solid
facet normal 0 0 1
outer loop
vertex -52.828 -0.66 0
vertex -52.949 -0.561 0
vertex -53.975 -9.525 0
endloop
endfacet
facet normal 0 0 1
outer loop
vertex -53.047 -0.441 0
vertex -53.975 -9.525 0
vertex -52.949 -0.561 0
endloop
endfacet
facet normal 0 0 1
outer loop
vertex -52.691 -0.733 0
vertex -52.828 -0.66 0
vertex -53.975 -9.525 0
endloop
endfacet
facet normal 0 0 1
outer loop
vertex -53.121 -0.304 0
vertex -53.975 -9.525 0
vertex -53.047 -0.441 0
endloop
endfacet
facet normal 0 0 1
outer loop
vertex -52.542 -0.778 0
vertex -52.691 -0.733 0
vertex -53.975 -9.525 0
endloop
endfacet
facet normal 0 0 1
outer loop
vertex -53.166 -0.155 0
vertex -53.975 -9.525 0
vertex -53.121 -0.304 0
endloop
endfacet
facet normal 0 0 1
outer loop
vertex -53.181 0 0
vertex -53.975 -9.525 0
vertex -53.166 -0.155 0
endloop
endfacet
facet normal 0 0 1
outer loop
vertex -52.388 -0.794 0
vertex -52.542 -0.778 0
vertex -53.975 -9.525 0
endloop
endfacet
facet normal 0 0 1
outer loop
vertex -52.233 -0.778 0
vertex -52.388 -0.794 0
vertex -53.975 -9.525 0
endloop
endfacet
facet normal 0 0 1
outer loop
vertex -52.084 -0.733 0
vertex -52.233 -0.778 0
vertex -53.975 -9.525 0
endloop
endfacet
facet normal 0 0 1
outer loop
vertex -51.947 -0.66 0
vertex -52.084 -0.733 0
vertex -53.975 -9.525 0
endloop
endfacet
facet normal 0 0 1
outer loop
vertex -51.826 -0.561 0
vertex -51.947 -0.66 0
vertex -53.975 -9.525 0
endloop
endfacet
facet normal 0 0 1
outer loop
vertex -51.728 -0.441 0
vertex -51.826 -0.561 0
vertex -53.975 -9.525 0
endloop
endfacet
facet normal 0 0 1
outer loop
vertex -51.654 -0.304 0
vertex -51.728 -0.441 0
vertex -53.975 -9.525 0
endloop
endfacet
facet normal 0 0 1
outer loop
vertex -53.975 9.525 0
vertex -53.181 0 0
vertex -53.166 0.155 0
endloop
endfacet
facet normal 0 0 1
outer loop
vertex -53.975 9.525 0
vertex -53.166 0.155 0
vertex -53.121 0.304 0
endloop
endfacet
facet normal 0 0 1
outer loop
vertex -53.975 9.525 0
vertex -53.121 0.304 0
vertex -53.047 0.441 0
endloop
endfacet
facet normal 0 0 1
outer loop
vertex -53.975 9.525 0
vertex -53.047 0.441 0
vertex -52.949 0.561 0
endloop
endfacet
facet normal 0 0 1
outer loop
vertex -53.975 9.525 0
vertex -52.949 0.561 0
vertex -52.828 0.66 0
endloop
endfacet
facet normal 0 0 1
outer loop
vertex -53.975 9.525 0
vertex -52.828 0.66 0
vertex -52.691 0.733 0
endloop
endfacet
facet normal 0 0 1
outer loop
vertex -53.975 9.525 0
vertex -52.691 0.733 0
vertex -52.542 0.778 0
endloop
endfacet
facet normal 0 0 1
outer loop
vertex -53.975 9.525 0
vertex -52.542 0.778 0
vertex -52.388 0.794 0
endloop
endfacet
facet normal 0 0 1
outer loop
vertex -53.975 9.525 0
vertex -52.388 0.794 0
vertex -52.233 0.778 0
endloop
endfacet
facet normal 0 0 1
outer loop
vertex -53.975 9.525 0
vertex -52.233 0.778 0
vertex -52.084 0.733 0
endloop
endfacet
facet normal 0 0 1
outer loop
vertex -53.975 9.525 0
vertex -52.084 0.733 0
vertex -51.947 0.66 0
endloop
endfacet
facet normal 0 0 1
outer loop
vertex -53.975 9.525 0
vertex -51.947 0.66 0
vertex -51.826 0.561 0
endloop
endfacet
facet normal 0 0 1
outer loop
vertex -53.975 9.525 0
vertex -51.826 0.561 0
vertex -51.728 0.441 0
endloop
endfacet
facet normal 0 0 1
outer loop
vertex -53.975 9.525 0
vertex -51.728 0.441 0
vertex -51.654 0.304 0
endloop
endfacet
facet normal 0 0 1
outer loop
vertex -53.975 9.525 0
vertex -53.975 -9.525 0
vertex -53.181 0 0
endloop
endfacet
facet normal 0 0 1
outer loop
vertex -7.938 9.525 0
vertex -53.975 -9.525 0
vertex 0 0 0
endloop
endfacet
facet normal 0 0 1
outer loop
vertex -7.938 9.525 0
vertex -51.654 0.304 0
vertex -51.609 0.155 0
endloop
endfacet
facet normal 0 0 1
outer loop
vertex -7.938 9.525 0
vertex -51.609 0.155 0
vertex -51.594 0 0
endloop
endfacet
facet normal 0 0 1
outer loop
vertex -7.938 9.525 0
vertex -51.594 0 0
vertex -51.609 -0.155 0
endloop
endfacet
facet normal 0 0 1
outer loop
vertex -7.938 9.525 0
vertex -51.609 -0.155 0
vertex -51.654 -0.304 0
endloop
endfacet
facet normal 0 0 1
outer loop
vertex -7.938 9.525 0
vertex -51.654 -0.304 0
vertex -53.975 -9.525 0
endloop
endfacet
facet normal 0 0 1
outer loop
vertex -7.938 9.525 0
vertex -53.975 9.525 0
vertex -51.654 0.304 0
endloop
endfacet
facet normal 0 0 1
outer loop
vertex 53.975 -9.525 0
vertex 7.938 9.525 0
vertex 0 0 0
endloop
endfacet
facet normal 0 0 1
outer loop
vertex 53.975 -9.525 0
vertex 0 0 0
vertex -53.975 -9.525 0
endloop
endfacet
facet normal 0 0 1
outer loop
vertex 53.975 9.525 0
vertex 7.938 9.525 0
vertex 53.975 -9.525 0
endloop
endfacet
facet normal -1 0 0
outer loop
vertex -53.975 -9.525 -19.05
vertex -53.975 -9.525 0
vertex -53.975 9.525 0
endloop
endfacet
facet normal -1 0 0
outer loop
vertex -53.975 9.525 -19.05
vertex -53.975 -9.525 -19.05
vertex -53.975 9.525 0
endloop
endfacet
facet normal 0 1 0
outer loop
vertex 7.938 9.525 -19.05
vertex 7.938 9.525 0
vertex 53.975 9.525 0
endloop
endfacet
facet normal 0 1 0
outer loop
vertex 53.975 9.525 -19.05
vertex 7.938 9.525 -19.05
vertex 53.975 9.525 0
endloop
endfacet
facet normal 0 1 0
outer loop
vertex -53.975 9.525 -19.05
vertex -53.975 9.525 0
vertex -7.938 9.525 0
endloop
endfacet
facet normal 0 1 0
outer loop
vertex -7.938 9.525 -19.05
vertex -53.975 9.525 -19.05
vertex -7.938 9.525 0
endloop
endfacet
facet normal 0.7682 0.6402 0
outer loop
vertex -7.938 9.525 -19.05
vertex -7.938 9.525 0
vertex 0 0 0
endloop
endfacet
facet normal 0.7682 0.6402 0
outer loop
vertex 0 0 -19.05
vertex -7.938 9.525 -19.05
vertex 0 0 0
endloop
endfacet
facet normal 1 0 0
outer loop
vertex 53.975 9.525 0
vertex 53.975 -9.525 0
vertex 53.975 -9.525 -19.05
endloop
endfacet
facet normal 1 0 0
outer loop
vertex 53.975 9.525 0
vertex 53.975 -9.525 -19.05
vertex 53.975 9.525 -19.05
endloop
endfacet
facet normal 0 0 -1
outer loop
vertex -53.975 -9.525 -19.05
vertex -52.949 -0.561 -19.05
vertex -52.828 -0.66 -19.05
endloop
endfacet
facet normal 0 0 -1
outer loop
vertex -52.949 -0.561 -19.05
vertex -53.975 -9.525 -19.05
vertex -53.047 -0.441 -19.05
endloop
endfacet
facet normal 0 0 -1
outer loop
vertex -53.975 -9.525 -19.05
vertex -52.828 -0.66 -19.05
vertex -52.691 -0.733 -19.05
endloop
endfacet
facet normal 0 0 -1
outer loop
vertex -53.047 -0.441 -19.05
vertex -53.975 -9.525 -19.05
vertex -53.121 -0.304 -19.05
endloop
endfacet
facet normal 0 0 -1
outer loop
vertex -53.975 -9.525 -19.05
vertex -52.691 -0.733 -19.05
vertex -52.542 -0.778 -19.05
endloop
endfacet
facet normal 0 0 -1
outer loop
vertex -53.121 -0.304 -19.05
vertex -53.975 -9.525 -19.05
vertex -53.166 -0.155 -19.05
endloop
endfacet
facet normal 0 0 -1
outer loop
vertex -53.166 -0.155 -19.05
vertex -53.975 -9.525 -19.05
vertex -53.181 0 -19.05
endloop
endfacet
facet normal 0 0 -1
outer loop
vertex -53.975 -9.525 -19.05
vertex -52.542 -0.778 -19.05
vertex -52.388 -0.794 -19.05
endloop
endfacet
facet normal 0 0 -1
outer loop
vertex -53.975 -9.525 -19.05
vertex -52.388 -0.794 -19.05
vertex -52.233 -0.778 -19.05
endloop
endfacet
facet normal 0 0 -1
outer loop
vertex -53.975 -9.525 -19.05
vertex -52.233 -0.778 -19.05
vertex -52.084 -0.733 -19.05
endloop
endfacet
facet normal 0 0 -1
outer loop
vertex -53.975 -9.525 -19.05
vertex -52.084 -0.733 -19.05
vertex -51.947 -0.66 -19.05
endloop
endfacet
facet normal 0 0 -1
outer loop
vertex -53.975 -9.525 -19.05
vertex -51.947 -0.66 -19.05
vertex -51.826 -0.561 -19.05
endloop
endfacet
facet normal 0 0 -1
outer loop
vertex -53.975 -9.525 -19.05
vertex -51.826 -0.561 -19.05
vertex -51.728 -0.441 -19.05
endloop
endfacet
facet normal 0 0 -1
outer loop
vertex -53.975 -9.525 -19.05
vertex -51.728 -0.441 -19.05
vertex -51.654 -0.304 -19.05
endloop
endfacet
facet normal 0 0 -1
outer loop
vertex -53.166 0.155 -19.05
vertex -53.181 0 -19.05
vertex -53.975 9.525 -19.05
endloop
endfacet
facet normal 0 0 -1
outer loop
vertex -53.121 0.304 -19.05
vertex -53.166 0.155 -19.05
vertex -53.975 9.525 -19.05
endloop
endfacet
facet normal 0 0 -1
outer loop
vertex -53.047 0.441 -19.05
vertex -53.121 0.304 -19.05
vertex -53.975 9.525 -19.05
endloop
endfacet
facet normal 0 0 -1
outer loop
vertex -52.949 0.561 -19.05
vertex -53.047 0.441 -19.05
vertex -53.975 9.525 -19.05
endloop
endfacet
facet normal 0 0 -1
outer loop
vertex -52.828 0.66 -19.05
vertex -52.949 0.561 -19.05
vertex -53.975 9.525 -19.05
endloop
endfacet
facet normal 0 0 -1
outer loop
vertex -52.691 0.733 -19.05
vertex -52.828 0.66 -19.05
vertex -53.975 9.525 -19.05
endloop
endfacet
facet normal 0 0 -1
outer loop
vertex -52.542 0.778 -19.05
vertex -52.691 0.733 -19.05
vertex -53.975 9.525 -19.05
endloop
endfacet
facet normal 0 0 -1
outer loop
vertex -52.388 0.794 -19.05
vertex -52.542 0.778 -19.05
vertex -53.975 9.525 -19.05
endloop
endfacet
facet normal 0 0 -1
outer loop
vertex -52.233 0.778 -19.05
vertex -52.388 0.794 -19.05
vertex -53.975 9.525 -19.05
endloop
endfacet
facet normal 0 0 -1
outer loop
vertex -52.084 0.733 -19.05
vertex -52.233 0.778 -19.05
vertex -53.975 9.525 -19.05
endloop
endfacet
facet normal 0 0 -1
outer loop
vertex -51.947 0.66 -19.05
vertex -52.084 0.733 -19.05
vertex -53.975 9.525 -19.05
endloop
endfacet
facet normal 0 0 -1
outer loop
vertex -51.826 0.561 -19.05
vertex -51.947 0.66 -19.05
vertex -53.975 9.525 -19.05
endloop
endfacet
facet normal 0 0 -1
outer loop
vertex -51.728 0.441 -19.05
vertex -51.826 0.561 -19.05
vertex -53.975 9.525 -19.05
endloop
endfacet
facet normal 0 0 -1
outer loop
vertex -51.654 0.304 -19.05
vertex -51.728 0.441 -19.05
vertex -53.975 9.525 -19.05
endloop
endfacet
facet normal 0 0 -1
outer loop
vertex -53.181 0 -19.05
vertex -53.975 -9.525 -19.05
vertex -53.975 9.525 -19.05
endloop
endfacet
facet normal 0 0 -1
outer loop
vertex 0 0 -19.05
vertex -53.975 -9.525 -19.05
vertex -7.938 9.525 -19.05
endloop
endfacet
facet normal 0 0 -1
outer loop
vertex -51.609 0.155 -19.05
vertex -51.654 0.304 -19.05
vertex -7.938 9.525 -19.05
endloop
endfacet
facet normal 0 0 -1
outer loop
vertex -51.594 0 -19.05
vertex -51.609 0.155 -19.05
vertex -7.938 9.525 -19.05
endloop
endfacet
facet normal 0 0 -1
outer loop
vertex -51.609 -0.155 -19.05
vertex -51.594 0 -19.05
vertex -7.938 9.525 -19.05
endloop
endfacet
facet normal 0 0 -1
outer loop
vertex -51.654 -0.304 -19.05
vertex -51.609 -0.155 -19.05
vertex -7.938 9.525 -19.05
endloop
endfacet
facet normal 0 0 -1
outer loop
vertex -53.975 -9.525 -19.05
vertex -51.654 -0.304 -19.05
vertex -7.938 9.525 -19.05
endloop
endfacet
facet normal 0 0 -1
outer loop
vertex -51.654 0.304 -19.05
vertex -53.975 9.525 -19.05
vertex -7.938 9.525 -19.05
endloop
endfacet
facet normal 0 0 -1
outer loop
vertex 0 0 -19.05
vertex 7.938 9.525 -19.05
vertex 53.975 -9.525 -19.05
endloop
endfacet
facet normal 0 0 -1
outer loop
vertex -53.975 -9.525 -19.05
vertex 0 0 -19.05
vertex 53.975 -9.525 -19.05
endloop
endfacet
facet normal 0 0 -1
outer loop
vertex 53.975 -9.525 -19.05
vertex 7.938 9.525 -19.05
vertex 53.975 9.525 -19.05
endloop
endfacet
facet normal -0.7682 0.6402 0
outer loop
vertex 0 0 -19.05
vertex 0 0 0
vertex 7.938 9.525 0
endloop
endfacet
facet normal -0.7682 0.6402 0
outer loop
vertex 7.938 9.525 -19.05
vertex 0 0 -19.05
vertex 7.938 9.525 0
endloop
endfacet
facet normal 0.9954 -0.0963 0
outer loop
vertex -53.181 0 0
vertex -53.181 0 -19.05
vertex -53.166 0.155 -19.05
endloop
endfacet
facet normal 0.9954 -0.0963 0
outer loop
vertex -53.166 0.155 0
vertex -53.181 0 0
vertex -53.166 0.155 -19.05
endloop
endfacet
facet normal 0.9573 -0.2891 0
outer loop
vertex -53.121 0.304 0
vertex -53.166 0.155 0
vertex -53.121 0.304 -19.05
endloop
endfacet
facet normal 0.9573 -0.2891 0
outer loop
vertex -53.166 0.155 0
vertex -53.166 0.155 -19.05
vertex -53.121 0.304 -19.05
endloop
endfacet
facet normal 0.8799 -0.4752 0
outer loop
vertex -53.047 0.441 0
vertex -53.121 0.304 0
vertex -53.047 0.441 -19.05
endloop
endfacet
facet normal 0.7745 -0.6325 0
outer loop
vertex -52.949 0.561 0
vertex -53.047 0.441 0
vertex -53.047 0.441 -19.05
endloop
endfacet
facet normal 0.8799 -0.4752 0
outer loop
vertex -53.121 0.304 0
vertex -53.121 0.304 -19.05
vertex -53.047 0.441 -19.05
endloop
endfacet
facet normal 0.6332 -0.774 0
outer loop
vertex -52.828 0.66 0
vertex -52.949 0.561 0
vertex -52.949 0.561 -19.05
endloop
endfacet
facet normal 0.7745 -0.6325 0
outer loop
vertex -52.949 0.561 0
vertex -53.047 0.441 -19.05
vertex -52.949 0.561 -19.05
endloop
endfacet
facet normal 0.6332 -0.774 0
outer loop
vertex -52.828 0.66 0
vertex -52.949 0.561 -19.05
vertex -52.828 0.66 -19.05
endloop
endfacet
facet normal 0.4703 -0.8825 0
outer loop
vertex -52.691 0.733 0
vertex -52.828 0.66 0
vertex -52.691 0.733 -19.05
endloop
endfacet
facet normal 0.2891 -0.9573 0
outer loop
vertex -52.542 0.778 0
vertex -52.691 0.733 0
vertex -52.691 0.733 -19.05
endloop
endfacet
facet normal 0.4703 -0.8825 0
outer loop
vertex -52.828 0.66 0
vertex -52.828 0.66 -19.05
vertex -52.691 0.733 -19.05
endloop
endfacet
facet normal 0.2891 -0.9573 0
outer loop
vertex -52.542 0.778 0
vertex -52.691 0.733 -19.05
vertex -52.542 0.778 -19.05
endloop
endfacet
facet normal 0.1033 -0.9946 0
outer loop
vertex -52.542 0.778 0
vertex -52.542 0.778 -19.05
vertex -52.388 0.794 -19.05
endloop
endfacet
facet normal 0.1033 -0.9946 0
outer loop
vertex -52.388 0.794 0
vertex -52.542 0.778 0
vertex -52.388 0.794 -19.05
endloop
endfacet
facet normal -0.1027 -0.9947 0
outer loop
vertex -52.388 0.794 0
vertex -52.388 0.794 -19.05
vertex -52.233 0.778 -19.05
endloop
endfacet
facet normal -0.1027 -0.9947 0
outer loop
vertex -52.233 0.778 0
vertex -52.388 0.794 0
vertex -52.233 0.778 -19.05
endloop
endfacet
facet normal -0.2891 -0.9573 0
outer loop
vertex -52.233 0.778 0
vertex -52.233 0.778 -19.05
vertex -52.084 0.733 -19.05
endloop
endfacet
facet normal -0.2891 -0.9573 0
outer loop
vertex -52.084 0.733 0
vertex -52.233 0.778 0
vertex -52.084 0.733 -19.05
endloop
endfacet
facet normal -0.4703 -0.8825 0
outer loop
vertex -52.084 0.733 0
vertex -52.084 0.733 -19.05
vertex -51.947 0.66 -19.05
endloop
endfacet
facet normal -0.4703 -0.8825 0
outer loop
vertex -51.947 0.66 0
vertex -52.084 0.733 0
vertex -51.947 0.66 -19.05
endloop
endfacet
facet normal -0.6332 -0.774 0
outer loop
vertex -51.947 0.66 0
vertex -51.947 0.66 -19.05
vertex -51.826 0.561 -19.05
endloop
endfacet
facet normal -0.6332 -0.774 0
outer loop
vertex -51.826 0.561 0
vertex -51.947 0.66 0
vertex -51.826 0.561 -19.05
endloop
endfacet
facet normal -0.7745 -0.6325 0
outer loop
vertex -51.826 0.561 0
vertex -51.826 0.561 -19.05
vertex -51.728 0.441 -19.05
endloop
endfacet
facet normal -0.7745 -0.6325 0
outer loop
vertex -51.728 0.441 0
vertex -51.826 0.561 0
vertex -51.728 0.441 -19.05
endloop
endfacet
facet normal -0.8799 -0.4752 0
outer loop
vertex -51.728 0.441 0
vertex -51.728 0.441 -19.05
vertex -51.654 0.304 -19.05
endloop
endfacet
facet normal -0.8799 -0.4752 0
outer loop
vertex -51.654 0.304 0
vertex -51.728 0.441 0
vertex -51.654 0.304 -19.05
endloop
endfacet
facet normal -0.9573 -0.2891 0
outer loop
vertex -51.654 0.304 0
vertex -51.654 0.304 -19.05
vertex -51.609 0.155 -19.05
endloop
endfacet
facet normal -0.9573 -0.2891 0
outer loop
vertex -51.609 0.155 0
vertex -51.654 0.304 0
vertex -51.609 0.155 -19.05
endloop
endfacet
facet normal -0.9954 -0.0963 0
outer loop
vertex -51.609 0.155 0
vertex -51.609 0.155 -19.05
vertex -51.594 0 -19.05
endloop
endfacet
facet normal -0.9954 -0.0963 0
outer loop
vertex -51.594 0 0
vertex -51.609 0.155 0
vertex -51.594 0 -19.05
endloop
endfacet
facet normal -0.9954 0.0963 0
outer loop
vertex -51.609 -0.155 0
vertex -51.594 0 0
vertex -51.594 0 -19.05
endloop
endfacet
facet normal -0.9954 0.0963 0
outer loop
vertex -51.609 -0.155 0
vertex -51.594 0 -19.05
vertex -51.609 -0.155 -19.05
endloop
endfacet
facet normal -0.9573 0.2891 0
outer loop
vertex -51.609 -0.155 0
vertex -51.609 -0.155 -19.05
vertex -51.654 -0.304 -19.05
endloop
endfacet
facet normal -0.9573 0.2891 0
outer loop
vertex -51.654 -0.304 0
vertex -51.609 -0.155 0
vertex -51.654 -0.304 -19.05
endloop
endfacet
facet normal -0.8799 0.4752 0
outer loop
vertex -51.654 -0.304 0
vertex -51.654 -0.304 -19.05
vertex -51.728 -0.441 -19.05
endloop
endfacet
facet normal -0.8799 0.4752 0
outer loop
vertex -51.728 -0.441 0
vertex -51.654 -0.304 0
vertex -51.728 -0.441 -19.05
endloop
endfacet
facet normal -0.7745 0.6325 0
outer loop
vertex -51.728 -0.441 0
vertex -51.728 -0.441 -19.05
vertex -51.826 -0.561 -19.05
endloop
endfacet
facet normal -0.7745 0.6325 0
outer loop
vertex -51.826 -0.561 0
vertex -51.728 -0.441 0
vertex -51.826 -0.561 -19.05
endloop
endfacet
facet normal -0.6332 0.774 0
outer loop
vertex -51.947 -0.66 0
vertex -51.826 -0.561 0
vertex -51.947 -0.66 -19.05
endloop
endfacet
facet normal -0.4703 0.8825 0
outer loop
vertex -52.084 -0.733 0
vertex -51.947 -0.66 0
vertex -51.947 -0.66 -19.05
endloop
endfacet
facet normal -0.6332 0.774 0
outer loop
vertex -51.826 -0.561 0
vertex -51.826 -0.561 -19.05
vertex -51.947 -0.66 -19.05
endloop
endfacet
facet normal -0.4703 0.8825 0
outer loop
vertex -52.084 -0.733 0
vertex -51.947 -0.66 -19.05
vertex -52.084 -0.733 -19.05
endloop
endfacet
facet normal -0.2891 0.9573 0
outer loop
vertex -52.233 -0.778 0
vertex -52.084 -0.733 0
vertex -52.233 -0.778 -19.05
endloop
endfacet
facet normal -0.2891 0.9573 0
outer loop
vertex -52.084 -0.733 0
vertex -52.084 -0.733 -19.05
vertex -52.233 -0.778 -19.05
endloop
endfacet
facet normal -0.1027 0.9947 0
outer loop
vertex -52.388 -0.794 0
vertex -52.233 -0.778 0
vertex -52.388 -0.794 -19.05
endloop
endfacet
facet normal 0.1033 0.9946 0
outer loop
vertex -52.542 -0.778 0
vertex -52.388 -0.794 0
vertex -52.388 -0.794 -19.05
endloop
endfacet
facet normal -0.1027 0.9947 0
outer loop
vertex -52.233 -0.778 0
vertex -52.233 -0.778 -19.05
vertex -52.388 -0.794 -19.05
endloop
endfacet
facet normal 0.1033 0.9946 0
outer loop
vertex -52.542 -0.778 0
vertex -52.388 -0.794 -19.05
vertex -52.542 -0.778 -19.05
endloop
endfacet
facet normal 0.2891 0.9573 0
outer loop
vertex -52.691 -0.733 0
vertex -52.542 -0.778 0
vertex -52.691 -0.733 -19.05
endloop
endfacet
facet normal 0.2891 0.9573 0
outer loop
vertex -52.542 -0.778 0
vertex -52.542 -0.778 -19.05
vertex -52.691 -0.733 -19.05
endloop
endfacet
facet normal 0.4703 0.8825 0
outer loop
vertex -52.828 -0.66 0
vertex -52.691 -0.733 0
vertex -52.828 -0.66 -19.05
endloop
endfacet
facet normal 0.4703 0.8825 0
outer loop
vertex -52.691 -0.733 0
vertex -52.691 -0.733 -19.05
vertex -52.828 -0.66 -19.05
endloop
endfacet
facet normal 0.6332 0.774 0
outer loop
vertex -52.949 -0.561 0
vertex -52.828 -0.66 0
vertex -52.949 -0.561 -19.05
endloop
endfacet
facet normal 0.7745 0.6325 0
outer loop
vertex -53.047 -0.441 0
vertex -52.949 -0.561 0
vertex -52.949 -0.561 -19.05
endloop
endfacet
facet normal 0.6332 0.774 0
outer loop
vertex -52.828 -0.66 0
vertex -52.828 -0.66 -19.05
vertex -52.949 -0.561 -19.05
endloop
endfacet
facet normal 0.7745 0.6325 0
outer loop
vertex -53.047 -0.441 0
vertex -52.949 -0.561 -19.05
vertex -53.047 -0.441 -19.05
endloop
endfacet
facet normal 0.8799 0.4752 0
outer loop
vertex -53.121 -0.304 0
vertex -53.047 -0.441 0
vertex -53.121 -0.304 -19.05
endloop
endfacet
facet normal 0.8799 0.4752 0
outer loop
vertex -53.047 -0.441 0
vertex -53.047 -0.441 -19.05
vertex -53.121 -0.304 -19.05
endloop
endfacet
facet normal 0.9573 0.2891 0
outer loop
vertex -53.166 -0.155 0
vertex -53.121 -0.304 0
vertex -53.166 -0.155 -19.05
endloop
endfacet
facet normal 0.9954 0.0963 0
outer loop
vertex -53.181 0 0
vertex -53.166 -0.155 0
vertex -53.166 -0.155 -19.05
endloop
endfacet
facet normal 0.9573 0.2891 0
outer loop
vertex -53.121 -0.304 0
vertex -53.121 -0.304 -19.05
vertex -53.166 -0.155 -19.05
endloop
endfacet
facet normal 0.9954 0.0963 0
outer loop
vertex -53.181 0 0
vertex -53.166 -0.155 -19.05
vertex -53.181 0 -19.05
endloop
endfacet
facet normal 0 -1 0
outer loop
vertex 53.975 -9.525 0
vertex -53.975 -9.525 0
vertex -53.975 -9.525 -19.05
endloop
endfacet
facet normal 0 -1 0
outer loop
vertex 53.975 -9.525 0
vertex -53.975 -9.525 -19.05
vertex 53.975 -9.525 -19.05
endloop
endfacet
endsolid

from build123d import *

# Parameters (mm, degrees)
F0_W     = 107.95
F0_H     = 19.05
F1_DEPTH = 19.05
F3_DEPTH = 25.4
F5_D     = 1.5875


with BuildPart() as f1:
    # F0 (on Top) → F1 (new body)
    with BuildSketch(Plane.XY):
        Rectangle(F0_W, F0_H)
    extrude(amount=-F1_DEPTH)

    # F2 (on face) → F3 (cut)
    with BuildSketch(Plane.XY):
        Polygon((-7.9375, 9.525), (0, 0), (7.9375, 9.525), align=None)
    extrude(amount=-F3_DEPTH, mode=Mode.SUBTRACT)

    # F5 (through all)
    with Locations(Plane.XY):
        with Locations((-52.3875, 0)):
            Hole(F5_D / 2)


solid = f1.part
